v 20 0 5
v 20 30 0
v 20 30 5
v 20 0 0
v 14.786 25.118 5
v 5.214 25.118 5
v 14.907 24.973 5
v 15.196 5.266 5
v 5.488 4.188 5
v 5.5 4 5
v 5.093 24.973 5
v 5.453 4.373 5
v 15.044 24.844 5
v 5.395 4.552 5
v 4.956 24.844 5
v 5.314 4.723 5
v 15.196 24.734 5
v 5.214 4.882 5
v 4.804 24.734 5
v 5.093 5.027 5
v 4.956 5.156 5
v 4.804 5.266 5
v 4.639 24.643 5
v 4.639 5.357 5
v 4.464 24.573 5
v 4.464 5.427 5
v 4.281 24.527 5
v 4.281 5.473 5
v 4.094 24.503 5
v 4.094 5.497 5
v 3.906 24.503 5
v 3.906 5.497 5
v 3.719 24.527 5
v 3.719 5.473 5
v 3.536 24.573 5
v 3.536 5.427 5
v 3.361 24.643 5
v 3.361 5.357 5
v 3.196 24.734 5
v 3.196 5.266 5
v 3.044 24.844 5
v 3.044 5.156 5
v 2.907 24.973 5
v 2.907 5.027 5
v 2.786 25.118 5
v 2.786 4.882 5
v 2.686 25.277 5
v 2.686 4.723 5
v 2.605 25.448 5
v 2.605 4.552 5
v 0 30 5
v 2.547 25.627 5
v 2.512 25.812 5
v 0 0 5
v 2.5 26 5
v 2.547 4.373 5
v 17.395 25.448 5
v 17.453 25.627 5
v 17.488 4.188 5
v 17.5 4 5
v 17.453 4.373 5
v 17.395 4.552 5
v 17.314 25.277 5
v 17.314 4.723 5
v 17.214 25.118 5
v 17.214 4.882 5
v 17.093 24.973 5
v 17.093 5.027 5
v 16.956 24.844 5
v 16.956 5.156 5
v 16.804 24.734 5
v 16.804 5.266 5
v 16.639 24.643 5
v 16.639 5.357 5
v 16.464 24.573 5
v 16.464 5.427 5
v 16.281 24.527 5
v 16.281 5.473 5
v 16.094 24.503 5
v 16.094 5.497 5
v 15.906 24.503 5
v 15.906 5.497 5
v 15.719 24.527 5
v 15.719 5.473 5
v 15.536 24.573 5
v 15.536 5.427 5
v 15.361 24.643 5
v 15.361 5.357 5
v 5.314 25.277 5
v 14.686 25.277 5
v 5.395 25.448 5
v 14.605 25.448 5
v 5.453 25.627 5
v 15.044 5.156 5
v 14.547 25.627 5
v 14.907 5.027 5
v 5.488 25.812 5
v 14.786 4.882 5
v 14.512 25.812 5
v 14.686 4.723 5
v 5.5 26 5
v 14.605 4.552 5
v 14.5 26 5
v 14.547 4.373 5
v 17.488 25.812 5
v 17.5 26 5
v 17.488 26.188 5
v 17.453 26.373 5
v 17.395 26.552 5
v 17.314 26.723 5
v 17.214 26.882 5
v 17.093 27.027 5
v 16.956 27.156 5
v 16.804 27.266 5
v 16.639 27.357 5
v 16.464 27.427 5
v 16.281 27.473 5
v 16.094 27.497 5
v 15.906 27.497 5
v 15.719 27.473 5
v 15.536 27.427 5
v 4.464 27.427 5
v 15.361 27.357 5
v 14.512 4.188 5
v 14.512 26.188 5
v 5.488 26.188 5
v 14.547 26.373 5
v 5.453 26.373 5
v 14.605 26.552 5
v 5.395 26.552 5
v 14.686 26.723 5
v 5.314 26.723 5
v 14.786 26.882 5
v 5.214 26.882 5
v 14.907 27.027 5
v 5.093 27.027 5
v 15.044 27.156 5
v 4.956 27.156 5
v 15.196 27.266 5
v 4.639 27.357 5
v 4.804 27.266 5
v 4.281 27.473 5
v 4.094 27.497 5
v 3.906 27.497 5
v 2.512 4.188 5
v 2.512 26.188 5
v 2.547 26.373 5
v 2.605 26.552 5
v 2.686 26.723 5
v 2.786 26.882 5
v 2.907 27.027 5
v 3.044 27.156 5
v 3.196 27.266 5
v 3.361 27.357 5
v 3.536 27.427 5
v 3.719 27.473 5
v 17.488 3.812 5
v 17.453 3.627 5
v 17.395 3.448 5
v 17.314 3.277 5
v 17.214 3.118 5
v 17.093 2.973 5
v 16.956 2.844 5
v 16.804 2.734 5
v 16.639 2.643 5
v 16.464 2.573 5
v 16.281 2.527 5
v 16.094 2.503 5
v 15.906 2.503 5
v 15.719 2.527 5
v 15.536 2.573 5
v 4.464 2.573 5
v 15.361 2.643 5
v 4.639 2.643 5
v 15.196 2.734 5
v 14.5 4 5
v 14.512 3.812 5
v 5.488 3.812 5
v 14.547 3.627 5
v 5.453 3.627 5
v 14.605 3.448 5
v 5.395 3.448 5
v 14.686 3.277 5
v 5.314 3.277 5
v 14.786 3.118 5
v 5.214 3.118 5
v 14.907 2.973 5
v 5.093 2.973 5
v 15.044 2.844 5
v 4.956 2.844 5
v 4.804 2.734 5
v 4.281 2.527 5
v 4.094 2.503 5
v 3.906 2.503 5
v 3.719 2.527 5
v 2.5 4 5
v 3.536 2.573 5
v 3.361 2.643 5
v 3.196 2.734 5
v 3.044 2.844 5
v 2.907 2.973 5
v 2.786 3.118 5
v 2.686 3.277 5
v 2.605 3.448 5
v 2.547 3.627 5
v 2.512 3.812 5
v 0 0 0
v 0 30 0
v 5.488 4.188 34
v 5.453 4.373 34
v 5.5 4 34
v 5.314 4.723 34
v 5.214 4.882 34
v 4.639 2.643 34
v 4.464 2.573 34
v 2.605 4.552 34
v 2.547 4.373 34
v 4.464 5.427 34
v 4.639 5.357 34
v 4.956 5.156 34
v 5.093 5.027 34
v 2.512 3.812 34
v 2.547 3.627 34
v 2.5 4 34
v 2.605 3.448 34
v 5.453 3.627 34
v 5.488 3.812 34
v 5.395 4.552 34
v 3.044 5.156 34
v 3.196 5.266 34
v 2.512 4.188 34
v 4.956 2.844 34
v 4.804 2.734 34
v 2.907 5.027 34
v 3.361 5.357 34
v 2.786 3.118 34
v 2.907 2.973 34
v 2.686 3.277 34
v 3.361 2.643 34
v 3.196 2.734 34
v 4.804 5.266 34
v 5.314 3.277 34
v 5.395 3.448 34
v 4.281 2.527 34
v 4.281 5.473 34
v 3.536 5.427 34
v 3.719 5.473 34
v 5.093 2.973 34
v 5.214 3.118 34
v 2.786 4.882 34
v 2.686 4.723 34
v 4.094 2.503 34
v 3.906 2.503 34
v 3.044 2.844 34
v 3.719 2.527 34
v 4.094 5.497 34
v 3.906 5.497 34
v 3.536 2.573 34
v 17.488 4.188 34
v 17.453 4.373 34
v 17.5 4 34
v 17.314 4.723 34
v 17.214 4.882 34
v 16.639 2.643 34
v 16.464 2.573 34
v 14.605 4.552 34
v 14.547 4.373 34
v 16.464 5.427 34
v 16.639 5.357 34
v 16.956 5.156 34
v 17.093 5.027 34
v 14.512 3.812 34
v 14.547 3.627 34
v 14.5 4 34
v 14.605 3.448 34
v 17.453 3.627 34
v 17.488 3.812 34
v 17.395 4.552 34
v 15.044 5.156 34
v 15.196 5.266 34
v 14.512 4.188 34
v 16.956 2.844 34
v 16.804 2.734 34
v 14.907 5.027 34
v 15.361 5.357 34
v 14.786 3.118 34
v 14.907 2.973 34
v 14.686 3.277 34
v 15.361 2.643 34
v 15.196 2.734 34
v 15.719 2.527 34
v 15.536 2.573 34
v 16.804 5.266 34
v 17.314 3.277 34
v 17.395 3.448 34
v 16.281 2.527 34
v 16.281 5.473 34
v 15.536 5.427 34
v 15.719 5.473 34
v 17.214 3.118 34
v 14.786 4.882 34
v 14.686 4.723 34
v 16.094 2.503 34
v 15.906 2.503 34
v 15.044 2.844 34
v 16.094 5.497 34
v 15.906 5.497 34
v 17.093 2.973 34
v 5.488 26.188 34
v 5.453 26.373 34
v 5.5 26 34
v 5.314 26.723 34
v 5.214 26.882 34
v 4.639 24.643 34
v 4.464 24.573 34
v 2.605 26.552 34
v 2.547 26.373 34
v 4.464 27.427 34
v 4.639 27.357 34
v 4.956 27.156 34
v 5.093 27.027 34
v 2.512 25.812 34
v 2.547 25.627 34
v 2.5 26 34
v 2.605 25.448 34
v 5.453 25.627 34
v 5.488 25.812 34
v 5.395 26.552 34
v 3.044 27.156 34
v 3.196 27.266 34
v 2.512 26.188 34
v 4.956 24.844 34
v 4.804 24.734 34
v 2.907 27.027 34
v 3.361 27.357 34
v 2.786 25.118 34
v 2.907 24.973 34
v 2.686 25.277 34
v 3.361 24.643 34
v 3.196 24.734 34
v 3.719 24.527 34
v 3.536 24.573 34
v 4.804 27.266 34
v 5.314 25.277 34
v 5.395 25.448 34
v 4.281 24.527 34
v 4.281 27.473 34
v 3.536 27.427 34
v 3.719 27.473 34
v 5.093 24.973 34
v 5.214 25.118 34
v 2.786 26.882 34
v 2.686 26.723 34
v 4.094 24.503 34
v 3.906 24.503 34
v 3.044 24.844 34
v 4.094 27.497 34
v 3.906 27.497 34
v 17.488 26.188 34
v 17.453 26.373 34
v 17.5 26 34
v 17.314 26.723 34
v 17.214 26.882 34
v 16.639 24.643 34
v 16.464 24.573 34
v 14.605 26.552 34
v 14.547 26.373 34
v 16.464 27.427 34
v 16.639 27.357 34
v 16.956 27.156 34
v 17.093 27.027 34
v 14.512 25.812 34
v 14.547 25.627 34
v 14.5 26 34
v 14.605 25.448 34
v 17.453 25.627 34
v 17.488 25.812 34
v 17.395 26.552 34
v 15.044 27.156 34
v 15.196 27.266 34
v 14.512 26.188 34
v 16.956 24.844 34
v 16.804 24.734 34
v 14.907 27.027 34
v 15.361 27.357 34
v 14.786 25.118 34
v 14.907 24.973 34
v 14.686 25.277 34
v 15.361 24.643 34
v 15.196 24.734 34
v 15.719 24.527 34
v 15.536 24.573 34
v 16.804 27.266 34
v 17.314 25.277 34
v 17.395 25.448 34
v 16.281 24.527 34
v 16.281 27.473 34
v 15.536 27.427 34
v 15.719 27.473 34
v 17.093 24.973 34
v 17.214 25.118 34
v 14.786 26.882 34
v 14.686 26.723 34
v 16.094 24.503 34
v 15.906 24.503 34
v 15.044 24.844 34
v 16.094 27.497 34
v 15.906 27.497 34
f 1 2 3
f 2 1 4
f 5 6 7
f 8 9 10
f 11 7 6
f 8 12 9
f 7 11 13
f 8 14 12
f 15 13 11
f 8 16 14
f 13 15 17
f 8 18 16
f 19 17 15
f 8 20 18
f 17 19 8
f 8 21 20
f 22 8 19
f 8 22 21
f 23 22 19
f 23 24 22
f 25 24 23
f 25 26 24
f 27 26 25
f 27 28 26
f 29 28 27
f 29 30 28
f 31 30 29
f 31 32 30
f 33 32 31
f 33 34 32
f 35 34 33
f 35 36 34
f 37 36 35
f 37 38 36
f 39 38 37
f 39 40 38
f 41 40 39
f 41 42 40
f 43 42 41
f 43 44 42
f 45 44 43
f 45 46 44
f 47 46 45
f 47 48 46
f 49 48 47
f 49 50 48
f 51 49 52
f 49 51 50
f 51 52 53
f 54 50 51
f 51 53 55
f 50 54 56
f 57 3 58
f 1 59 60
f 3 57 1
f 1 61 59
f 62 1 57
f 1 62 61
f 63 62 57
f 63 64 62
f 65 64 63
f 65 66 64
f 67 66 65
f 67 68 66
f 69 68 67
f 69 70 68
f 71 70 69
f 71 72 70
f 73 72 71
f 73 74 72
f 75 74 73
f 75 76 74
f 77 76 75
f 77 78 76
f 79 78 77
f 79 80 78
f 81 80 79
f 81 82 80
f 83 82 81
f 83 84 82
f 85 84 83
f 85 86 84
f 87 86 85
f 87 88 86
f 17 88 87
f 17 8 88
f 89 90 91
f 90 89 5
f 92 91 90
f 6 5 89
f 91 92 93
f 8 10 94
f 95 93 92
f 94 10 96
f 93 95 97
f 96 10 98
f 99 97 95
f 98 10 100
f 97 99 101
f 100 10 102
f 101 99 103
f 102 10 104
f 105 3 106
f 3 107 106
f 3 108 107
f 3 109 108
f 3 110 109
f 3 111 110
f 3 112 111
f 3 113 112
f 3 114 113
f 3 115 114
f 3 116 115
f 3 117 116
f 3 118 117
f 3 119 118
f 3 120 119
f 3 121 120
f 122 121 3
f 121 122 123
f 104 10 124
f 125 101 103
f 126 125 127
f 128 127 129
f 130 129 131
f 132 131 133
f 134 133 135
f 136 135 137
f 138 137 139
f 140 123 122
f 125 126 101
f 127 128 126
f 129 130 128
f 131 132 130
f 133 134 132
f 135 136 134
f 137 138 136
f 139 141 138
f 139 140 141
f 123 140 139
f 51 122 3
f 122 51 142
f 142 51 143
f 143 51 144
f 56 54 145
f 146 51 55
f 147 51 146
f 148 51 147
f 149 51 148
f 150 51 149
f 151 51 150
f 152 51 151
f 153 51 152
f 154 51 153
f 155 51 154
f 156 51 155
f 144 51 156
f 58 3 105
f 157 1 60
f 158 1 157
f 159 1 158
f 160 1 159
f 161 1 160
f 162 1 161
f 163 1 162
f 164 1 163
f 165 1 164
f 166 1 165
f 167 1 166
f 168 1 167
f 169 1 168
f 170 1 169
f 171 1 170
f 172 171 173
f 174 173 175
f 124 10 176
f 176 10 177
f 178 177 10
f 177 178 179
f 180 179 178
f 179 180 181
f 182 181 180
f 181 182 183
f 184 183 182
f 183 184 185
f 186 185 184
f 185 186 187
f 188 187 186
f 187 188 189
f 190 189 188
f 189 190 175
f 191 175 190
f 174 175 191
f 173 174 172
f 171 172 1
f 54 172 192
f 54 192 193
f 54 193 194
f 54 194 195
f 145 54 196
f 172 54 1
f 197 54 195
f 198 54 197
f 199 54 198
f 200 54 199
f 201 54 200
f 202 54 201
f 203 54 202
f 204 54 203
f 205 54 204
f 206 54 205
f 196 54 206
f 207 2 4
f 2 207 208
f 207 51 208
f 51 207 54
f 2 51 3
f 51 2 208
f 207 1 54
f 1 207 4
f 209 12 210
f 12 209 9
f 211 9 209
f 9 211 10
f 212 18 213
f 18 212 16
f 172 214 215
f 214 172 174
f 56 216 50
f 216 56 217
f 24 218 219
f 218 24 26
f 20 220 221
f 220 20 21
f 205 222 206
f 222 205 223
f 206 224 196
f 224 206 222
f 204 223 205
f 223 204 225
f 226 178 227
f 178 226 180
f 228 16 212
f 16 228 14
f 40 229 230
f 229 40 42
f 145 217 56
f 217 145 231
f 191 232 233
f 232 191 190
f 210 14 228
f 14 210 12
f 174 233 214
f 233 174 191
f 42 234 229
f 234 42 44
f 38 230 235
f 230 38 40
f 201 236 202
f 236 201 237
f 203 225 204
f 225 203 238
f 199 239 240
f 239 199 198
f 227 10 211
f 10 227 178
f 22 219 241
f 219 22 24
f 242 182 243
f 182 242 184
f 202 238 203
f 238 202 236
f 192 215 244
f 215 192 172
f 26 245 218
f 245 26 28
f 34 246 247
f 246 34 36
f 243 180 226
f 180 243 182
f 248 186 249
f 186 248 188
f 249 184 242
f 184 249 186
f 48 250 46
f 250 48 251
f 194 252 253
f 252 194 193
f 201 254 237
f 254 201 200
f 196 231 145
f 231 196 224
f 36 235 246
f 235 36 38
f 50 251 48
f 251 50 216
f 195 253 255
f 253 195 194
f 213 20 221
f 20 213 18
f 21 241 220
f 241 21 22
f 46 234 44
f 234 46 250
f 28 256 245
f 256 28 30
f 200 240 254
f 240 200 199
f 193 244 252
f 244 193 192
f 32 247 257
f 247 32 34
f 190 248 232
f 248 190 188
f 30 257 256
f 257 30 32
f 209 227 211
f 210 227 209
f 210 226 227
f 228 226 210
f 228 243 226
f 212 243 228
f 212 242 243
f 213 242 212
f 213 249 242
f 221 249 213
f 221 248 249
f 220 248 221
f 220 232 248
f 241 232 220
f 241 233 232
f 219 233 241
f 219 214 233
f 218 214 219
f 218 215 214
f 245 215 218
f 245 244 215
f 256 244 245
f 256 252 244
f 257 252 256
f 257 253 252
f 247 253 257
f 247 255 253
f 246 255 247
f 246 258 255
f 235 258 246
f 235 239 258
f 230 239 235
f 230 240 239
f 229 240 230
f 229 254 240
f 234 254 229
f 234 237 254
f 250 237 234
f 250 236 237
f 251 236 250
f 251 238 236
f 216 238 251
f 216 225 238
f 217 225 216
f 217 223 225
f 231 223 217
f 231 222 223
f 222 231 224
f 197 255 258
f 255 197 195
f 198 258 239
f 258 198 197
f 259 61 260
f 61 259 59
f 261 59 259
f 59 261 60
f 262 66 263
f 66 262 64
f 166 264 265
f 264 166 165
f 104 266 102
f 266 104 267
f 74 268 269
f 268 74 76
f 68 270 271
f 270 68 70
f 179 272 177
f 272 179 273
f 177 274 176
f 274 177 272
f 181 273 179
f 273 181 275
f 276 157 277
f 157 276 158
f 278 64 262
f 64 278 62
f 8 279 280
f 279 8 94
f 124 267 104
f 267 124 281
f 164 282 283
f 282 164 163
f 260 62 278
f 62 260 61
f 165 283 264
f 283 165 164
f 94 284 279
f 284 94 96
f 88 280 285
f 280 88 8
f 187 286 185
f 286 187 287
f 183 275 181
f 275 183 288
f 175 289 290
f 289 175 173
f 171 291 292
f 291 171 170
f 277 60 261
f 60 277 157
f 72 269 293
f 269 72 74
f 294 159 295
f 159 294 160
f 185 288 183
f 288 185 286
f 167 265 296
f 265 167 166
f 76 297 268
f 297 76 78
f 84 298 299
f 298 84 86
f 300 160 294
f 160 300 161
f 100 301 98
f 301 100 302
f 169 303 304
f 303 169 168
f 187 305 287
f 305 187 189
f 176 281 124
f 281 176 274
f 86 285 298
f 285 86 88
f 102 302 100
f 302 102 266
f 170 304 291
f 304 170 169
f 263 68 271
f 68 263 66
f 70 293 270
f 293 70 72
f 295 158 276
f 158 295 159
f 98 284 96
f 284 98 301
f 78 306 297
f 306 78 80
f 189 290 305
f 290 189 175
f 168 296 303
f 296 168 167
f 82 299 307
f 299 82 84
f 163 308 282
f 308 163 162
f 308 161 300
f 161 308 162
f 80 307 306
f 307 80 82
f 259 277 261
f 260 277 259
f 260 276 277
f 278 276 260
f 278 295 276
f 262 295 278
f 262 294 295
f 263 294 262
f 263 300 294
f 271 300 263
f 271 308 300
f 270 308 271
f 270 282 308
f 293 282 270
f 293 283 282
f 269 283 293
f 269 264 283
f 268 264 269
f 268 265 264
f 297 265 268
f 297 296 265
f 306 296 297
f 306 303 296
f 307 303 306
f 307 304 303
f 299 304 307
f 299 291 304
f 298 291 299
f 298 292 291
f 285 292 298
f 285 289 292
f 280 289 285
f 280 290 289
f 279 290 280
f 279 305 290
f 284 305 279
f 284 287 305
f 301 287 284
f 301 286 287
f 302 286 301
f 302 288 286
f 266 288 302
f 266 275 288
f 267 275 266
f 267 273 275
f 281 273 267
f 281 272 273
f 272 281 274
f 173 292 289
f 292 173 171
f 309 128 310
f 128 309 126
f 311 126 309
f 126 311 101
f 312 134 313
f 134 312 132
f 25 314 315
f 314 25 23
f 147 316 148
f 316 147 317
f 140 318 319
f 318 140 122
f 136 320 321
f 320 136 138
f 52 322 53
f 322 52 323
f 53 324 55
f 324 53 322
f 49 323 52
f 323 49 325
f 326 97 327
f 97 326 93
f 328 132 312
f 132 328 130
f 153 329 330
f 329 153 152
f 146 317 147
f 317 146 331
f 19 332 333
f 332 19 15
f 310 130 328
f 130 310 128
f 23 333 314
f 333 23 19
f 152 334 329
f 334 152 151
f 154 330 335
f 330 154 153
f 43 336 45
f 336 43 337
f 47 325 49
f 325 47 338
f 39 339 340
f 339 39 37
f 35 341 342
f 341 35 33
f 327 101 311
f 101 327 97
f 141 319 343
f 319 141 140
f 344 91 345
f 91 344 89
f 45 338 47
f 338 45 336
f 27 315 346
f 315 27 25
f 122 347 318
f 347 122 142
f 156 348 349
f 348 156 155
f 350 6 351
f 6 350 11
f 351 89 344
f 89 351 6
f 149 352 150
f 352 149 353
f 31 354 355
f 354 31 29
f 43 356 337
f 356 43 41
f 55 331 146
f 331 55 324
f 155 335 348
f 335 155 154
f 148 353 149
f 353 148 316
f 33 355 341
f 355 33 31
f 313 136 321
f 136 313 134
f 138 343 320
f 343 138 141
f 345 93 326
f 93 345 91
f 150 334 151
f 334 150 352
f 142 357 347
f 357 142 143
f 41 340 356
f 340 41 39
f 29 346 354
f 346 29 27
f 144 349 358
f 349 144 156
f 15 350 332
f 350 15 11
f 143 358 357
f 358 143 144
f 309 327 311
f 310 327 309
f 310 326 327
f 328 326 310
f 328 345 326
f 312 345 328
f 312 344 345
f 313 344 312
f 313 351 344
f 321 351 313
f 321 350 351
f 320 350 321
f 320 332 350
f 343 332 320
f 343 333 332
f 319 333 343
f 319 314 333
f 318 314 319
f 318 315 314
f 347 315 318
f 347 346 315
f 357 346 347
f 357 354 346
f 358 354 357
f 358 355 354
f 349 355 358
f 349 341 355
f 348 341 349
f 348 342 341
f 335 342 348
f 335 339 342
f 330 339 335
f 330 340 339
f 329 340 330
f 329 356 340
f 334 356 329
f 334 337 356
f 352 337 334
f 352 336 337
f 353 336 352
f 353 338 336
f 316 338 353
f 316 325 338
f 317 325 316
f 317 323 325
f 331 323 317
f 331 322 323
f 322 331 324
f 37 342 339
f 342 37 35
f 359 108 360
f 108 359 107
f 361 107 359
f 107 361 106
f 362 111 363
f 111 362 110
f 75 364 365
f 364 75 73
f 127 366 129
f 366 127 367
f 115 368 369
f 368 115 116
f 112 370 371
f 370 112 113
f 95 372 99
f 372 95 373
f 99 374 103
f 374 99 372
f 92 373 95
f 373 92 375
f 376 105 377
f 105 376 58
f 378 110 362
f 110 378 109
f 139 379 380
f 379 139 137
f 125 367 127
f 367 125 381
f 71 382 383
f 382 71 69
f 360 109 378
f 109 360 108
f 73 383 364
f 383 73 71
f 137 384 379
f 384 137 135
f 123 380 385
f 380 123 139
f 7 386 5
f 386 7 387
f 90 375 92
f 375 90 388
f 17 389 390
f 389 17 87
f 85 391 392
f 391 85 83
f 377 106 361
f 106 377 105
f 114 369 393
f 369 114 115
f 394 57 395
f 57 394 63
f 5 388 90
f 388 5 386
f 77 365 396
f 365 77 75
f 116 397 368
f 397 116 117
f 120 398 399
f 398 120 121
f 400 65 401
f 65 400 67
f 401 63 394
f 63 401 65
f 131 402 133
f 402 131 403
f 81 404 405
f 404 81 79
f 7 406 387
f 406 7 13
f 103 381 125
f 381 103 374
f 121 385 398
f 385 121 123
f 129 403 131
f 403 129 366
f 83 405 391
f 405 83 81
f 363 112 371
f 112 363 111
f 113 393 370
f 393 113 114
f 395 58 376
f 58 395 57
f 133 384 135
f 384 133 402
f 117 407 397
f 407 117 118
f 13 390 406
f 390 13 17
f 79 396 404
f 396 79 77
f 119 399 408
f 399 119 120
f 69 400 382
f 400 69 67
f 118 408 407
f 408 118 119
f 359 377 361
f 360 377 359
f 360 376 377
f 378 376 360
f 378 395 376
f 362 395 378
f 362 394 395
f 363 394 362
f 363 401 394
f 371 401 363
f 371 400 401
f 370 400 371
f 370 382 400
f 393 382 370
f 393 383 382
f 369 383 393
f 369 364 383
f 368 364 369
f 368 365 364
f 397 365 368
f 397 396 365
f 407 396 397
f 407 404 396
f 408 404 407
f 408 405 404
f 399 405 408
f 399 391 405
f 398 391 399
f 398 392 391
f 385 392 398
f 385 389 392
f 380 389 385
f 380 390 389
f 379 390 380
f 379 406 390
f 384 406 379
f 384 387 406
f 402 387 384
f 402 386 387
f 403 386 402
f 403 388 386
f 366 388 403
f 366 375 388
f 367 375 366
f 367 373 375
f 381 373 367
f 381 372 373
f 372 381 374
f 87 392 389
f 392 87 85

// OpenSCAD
// Define the dimensions of the plate
$fn = 50; // For better round corners

// Define the dimensions of the holes
hole_diameter = 3;
hole_distance = 4;

// Define the dimensions of the plate
plate_width = 20;
plate_height = 30;
plate_depth = 5;

// Create the plate
module plate() {
    // Create the base of the plate
    translate([0, 0, 0]) {
        cube([plate_width, plate_height, plate_depth]);
    }

    // Create the holes
    translate([hole_distance, hole_distance, hole_distance]) {
        cylinder(r=hole_diameter/2, h=plate_height, $fn=50);
    }
    translate([plate_width-hole_distance, hole_distance, hole_distance]) {
        cylinder(r=hole_diameter/2, h=plate_height, $fn=50);
    }
    translate([hole_distance, plate_height-hole_distance, hole_distance]) {
        cylinder(r=hole_diameter/2, h=plate_height, $fn=50);
    }
    translate([plate_width-hole_distance, plate_height-hole_distance, hole_distance]) {
        cylinder(r=hole_diameter/2, h=plate_height, $fn=50);
    }
}

// Call the plate module
plate();
